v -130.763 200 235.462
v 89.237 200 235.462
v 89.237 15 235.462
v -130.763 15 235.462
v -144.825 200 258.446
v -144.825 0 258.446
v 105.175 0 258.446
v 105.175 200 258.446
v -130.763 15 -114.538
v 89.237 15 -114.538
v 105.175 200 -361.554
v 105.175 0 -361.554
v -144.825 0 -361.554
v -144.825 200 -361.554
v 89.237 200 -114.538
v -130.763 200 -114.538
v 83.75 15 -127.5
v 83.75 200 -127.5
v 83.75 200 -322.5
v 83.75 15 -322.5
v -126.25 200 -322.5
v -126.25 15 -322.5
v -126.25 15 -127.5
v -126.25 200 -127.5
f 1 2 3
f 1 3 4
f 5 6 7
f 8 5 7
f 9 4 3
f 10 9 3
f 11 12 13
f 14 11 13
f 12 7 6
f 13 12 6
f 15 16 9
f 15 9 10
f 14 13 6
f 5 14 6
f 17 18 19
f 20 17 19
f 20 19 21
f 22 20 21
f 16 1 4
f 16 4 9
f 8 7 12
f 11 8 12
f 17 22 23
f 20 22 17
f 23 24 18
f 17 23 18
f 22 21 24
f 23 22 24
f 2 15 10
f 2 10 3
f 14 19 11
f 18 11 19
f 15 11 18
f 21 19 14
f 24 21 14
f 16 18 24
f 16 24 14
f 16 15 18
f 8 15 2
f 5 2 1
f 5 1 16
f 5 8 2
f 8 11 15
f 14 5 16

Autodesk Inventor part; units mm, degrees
ref_plane "YZ Plane" through (0, 0, 0) normal (1, 0, 0) x (0, 1, 0)
ref_plane "XZ Plane" through (0, 0, 0) normal (0, 1, 0) x (-1, 0, 0)
ref_plane "XY Plane" through (0, 0, 0) normal (0, 0, 1) x (1, 0, 0)
sketch "Sketch1" plane through (0, 0, 0) normal (0, 1, 0) x (-1, 0, 0)
  line L0 (144.8249, 258.4464) -> (-105.1751, 258.4464)
  line L1 (-105.1751, 258.4464) -> (-105.1751, -361.5536)
  line L2 (-105.1751, -361.5536) -> (144.8249, -361.5536)
  line L3 (144.8249, -361.5536) -> (144.8249, 258.4464)
  point P0 (0, 0)
  dimension "d0" = 620
  dimension "d1" = 250
extrude "Extrusion1" add sketch "Sketch1" along normal blind 200
sketch "Sketch2" plane through (0, 200, 0) normal (0, 1, 0) x (1, 0, 0)
  line L0 (89.2369, -235.4618) -> (-130.7631, -235.4618)
  line L1 (-130.7631, -235.4618) -> (-130.7631, 114.5382)
  line L2 (-130.7631, 114.5382) -> (89.2369, 114.5382)
  line L3 (89.2369, 114.5382) -> (89.2369, -235.4618)
  point P0 (0, 0)
  dimension "d4" = 220
  dimension "d5" = 350
extrude "Extrusion2" cut sketch "Sketch2" against normal blind 185
sketch "Sketch3" plane through (0, 200, 0) normal (0, 1, 0) x (1, 0, 0)
  line L0 (-126.25, 127.5) -> (83.75, 127.5)
  line L1 (83.75, 127.5) -> (83.75, 322.5)
  line L2 (83.75, 322.5) -> (-126.25, 322.5)
  line L3 (-126.25, 322.5) -> (-126.25, 127.5)
  point P0 (0, 0)
  dimension "d8" = 210
  dimension "d9" = 195
extrude "Extrusion3" cut sketch "Sketch3" against normal blind 185
properties part number "collector"
